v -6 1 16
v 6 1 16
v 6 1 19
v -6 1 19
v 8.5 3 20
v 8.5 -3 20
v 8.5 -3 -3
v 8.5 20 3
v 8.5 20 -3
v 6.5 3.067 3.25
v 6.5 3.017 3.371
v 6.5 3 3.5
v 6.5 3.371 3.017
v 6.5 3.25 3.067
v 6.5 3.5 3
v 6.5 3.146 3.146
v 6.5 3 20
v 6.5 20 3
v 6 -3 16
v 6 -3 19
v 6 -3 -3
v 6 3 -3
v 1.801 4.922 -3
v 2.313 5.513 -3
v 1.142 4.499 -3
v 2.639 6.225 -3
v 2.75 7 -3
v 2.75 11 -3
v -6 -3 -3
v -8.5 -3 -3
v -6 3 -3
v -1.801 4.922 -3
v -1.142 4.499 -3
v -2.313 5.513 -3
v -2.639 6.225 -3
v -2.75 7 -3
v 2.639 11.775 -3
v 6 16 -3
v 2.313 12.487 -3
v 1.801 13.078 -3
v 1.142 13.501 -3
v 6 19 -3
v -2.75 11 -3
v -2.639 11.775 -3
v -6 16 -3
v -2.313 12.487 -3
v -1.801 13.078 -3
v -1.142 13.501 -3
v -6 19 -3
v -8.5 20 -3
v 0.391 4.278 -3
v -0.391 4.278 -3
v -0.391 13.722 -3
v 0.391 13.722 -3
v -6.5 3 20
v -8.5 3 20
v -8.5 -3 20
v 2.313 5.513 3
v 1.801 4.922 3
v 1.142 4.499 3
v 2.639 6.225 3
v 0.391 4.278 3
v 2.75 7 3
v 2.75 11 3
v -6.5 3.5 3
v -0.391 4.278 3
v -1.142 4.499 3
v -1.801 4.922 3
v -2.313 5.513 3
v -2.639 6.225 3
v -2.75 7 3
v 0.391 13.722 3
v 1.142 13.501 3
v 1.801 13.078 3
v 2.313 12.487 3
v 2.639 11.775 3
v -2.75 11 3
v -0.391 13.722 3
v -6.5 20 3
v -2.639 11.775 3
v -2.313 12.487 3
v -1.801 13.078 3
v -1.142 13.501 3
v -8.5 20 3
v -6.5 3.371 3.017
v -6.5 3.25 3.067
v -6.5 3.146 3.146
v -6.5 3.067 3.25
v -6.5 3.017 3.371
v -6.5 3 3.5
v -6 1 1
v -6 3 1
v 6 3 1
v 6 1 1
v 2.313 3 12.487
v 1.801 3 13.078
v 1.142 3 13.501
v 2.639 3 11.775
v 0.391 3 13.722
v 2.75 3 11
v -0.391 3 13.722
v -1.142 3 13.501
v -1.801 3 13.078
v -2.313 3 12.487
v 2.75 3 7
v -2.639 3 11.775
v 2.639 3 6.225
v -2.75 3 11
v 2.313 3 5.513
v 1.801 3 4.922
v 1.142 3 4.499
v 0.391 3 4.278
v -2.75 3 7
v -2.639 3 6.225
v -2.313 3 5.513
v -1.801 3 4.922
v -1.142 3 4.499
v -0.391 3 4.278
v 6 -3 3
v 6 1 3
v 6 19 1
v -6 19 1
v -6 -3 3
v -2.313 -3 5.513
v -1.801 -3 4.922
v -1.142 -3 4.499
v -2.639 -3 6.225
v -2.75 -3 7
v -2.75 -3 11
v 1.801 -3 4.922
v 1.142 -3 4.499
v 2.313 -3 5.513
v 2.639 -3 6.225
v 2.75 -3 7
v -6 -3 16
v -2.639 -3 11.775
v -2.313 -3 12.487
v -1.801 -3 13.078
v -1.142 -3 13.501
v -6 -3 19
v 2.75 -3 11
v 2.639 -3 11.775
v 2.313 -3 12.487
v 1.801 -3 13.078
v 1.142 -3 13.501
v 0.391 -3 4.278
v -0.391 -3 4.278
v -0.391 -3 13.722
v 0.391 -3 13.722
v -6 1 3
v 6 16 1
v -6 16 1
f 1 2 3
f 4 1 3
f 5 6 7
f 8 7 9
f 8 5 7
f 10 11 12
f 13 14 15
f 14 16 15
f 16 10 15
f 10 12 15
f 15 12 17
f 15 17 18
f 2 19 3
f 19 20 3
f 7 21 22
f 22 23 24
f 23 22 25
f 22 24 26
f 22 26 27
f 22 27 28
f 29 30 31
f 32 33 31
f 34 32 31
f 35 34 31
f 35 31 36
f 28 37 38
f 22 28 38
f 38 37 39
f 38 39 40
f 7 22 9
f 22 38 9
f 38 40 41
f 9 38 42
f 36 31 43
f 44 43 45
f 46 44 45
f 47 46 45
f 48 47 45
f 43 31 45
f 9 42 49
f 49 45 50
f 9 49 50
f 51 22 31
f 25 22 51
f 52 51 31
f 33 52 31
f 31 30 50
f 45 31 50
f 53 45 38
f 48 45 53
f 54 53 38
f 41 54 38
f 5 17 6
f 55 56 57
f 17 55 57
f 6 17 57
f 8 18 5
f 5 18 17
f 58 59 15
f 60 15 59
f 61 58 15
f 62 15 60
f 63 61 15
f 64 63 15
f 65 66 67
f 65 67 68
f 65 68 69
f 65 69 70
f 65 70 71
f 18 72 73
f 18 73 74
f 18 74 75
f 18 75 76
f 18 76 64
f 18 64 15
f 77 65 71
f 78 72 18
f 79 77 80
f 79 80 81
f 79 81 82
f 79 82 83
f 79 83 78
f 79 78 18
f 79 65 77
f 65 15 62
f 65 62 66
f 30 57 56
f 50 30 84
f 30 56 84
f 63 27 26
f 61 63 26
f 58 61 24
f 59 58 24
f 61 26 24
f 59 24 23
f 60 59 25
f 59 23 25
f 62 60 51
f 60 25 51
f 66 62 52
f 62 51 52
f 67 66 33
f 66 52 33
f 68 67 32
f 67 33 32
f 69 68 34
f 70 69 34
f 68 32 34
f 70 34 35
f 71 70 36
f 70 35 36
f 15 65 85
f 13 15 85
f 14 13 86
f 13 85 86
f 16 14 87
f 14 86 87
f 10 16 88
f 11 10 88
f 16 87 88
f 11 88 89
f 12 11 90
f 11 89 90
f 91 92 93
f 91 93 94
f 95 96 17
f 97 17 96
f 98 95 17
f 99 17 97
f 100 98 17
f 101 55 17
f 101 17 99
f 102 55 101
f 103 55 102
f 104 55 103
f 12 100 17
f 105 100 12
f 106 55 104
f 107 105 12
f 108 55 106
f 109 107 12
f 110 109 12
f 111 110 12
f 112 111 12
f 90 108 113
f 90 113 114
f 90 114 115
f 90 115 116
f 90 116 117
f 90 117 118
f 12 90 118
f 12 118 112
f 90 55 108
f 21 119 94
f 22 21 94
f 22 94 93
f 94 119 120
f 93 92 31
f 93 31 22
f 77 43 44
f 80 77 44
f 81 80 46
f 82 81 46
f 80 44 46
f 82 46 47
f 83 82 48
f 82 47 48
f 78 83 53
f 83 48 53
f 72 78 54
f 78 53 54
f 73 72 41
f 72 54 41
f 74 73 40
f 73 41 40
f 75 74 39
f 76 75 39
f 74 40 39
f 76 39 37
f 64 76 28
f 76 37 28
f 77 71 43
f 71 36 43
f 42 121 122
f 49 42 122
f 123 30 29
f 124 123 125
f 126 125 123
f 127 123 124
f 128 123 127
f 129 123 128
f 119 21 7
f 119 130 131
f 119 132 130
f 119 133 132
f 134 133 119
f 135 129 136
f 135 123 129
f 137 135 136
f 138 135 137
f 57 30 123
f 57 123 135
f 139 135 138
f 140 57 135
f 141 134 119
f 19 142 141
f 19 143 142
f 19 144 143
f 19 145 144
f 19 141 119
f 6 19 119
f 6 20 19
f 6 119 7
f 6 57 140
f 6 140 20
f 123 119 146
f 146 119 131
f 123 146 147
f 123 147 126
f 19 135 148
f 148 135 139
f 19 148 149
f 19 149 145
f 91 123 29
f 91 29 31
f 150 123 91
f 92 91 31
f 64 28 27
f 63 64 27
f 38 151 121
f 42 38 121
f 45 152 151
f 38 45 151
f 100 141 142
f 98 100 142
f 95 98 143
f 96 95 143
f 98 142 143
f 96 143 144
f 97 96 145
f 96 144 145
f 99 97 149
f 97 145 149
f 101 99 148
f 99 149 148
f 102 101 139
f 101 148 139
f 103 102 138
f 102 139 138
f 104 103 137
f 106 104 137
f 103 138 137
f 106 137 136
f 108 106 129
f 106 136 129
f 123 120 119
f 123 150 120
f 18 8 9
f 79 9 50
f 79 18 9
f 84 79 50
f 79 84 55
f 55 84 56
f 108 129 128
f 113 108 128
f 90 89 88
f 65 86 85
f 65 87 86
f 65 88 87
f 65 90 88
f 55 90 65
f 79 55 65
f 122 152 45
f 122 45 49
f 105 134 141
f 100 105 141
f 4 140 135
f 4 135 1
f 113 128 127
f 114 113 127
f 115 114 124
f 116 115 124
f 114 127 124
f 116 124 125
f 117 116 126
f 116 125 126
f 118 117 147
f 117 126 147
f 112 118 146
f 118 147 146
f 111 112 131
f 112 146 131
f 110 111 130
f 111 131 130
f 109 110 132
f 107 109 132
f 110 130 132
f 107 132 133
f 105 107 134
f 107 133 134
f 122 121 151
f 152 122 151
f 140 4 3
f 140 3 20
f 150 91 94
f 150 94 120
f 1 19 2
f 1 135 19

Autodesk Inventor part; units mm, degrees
ref_plane "YZ Plane" through (0, 0, 0) normal (1, 0, 0) x (0, 1, 0)
ref_plane "XZ Plane" through (0, 0, 0) normal (0, 1, 0) x (-1, 0, 0)
ref_plane "XY Plane" through (0, 0, 0) normal (0, 0, 1) x (1, 0, 0)
sketch "Sketch_1" plane through (0, 0, 0) normal (1, 0, 0) x (0, 1, 0)
  line L0 (0, 20) -> (0, 0)
  line L1 (0, 0) -> (20, 0)
  line L2 (20, 0) -> (20, 3)
  line L3 (20, 3) -> (3, 20)
  line L4 (3, 20) -> (0, 20)
  dimension "d35" = 20
  dimension "d36" = 20
  dimension "d37" = 17
  dimension "d38" = 3
extrude "Extrusion1" add sketch "Sketch_1" along normal mid plane 17
sketch "Sketch_2" plane through (0, 0, 0) normal (1, 0, 0) x (0, 1, 0)
  line L0 (3, 20) -> (3, 3.5)
  arc A0 (3, 3.5) -> (3.5, 3) centre (3.5, 3.5) ccw
  line L1 (3.5, 3) -> (20, 3)
  line L2 (20, 3) -> (3, 20)
extrude "Extrusion2" cut sketch "Sketch_2" along normal mid plane 13
sketch "Sketch_3" plane through (0, 0, 0) normal (1, 0, 0) x (0, 1, 0)
  line L0 (0, 3) -> (0, 0)
  line L1 (0, 0) -> (3, 0)
  line L2 (3, 0) -> (3, 1)
  line L3 (3, 1) -> (1, 1)
  line L4 (1, 1) -> (1, 3)
  line L5 (1, 3) -> (0, 3)
extrude "Extrusion3" cut sketch "Sketch_3" along normal mid plane 12
sketch "Sketch_4" plane through (0, 0, 0) normal (1, 0, 0) x (0, 1, 0)
  line L0 (0, 19) -> (0, 16)
  line L1 (0, 16) -> (1, 16)
  line L2 (1, 16) -> (1, 19)
  line L3 (1, 19) -> (0, 19)
extrude "Extrusion4" cut sketch "Sketch_4" along normal mid plane 12
sketch "Sketch_5" plane through (0, 0, 0) normal (1, 0, 0) x (0, 1, 0)
  line L0 (16, 1) -> (16, 0)
  line L1 (16, 0) -> (19, 0)
  line L2 (19, 0) -> (19, 1)
  line L3 (19, 1) -> (16, 1)
extrude "Extrusion5" cut sketch "Sketch_5" along normal mid plane 12
move faces "Move1" translate (0, 0, -3) faces at (-2, 7.3333, 0) (-2, 0, 11.6667)
move faces "Move2" translate (0, -3, 0) faces at (-2, 0, 7.3333)
sketch "Sketch8" plane through (-8.5, -3, 20) normal (0, -1, 0) x (1, 0, 0)
  line L0 (8.5, -9) -> (8.5, -13) construction
  line L1 (5.75, -9) -> (5.75, -13)
  line L2 (11.25, -13) -> (11.25, -9)
  arc A0 (11.25, -9) -> (5.75, -9) centre (8.5, -9) ccw
  arc A1 (5.75, -13) -> (11.25, -13) centre (8.5, -13) ccw
  line L3 (14.5, -23) -> (2.5, -23) projected
  line L4 (17, 0) -> (17, -23) projected
  point P0 (8.5, -20)
  point P1 (8.5, -11)
  dimension "d23" = 2
  dimension "d24" = 5.5
  dimension "d25" = 12
  dimension "d32" = 8.5
extrude "Extrusion8" cut sketch "Sketch8" against normal through all
sketch "Sketch9" plane through (8.5, 20, -3) normal (0, 0, -1) x (-1, 0, 0)
  line L0 (8.5, -9) -> (8.5, -13) construction
  line L1 (5.75, -9) -> (5.75, -13)
  line L2 (11.25, -13) -> (11.25, -9)
  arc A0 (11.25, -9) -> (5.75, -9) centre (8.5, -9) ccw
  arc A1 (5.75, -13) -> (11.25, -13) centre (8.5, -13) ccw
  line L3 (17, -23) -> (14.5, -23) projected
  line L4 (0, -23) -> (0, 0) projected
  point P0 (8.5, -20)
  point P1 (8.5, -11)
  dimension "d28" = 2
  dimension "d29" = 5.5
  dimension "d30" = 12
  dimension "d31" = 8.5
extrude "Extrusion9" cut sketch "Sketch9" against normal through all
properties part number "14056_m"
